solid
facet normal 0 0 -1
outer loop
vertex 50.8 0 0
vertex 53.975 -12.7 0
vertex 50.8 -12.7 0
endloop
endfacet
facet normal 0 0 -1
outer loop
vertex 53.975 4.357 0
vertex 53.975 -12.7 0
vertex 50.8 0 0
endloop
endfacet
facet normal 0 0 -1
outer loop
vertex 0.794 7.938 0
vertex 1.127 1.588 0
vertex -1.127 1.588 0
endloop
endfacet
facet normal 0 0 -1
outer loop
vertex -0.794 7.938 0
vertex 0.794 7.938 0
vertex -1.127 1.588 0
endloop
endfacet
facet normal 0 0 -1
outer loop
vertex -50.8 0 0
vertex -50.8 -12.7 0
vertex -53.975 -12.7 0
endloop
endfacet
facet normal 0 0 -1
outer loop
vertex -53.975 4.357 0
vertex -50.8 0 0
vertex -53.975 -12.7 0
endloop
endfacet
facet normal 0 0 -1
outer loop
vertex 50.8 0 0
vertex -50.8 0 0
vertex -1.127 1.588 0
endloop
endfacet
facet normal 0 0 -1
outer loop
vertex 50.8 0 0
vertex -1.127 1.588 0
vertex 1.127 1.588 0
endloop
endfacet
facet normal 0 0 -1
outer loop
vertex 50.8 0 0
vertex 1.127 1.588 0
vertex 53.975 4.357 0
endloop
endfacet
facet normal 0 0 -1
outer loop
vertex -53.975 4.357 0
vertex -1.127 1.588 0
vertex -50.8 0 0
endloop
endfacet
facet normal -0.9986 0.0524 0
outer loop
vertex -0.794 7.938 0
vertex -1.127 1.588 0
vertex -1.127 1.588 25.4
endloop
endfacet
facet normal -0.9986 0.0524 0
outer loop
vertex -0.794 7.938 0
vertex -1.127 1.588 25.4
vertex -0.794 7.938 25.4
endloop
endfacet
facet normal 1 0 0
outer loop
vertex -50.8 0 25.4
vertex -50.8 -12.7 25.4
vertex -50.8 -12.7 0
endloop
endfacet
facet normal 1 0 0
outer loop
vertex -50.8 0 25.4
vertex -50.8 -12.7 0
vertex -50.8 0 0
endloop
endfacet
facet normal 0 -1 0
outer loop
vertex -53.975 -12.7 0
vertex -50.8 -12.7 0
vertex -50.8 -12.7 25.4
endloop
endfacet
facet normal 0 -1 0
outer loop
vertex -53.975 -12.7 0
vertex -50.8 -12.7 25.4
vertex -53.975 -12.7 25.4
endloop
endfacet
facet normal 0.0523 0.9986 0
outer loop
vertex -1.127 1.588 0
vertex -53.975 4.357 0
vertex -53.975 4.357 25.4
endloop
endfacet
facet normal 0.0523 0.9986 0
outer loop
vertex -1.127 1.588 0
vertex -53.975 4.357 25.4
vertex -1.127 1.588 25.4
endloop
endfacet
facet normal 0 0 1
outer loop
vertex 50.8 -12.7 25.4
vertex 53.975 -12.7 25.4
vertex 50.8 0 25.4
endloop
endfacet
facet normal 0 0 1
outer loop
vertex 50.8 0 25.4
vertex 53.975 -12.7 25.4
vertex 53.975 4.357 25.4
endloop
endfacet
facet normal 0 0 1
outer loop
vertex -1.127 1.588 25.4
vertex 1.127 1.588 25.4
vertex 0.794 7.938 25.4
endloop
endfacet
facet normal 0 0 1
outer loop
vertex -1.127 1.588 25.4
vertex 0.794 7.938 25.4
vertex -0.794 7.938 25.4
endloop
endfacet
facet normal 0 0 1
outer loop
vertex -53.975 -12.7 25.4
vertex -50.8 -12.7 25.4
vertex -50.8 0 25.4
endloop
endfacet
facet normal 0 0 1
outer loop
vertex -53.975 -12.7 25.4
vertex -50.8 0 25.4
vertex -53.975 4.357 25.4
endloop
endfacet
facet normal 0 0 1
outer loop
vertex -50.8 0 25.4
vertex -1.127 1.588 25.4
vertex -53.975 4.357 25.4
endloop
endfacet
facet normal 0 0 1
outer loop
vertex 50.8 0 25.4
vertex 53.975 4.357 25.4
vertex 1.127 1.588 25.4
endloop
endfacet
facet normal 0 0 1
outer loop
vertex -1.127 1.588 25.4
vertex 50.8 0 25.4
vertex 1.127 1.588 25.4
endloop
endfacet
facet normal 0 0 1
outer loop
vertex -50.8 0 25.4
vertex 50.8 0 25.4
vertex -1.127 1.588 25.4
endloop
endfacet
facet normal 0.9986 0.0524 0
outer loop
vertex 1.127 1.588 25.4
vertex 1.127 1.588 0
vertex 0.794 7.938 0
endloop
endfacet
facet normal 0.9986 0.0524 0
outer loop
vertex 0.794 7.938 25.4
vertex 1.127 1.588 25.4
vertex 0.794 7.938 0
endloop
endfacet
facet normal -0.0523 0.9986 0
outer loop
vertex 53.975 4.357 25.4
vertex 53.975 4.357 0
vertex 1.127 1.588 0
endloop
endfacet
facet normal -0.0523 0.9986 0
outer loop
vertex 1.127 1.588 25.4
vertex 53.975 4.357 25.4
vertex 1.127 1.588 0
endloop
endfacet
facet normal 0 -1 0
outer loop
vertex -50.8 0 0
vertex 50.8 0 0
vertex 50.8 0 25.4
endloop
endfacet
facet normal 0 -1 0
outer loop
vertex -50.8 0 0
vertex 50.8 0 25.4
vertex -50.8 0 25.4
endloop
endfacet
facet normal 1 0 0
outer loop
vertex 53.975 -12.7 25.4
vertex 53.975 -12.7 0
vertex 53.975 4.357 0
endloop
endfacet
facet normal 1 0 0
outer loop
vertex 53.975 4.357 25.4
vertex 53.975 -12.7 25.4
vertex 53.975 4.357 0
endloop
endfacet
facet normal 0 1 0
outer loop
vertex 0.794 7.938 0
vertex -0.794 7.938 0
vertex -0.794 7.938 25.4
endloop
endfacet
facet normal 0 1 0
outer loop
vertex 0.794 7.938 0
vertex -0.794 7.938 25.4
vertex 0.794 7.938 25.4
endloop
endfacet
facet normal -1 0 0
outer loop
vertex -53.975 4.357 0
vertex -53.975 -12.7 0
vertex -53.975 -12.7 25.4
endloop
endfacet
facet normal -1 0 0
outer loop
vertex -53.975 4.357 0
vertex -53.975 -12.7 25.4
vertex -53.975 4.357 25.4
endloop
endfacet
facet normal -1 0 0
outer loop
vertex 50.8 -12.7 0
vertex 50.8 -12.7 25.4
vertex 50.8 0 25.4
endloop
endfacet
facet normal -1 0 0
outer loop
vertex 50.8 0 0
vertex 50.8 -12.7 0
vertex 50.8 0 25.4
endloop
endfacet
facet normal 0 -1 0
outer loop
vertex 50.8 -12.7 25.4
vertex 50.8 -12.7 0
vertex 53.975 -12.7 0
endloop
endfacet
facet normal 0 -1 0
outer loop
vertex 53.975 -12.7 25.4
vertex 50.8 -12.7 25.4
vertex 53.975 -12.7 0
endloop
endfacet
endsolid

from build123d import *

# Parameters (mm, degrees)
SKETCH3_W           = 53.975
SKETCH3_H           = 1.5875
SKETCH3_W_2         = 3.175
SKETCH3_H_2         = 12.7
BOSS_EXTRUDE2_DEPTH = 25.4


with BuildPart() as part:
    # Sketch3 → Boss-Extrude2 (new body)
    with BuildSketch(Plane.XY):
        with Locations((26.9875, 0.79375)):
            Rectangle(SKETCH3_W, SKETCH3_H)
        with Locations((52.3875, -6.35)):
            Rectangle(SKETCH3_W_2, SKETCH3_H_2)
        Polygon((53.975, 4.357170459), (1.126539398, 1.5875), (53.975, 1.5875), align=None)
        Polygon((0, 7.9375), (0, 1.5875), (1.126539398, 1.5875), (0.79375, 7.9375), align=None)
    boss_extrude2 = extrude(amount=BOSS_EXTRUDE2_DEPTH)

    # Mirror1: Boss-Extrude2 across plane
    add(boss_extrude2.mirror(Plane(origin=(0, 0, 0), x_dir=(0, 0, 1), z_dir=(1, 0, 0))))


solid = part.part
